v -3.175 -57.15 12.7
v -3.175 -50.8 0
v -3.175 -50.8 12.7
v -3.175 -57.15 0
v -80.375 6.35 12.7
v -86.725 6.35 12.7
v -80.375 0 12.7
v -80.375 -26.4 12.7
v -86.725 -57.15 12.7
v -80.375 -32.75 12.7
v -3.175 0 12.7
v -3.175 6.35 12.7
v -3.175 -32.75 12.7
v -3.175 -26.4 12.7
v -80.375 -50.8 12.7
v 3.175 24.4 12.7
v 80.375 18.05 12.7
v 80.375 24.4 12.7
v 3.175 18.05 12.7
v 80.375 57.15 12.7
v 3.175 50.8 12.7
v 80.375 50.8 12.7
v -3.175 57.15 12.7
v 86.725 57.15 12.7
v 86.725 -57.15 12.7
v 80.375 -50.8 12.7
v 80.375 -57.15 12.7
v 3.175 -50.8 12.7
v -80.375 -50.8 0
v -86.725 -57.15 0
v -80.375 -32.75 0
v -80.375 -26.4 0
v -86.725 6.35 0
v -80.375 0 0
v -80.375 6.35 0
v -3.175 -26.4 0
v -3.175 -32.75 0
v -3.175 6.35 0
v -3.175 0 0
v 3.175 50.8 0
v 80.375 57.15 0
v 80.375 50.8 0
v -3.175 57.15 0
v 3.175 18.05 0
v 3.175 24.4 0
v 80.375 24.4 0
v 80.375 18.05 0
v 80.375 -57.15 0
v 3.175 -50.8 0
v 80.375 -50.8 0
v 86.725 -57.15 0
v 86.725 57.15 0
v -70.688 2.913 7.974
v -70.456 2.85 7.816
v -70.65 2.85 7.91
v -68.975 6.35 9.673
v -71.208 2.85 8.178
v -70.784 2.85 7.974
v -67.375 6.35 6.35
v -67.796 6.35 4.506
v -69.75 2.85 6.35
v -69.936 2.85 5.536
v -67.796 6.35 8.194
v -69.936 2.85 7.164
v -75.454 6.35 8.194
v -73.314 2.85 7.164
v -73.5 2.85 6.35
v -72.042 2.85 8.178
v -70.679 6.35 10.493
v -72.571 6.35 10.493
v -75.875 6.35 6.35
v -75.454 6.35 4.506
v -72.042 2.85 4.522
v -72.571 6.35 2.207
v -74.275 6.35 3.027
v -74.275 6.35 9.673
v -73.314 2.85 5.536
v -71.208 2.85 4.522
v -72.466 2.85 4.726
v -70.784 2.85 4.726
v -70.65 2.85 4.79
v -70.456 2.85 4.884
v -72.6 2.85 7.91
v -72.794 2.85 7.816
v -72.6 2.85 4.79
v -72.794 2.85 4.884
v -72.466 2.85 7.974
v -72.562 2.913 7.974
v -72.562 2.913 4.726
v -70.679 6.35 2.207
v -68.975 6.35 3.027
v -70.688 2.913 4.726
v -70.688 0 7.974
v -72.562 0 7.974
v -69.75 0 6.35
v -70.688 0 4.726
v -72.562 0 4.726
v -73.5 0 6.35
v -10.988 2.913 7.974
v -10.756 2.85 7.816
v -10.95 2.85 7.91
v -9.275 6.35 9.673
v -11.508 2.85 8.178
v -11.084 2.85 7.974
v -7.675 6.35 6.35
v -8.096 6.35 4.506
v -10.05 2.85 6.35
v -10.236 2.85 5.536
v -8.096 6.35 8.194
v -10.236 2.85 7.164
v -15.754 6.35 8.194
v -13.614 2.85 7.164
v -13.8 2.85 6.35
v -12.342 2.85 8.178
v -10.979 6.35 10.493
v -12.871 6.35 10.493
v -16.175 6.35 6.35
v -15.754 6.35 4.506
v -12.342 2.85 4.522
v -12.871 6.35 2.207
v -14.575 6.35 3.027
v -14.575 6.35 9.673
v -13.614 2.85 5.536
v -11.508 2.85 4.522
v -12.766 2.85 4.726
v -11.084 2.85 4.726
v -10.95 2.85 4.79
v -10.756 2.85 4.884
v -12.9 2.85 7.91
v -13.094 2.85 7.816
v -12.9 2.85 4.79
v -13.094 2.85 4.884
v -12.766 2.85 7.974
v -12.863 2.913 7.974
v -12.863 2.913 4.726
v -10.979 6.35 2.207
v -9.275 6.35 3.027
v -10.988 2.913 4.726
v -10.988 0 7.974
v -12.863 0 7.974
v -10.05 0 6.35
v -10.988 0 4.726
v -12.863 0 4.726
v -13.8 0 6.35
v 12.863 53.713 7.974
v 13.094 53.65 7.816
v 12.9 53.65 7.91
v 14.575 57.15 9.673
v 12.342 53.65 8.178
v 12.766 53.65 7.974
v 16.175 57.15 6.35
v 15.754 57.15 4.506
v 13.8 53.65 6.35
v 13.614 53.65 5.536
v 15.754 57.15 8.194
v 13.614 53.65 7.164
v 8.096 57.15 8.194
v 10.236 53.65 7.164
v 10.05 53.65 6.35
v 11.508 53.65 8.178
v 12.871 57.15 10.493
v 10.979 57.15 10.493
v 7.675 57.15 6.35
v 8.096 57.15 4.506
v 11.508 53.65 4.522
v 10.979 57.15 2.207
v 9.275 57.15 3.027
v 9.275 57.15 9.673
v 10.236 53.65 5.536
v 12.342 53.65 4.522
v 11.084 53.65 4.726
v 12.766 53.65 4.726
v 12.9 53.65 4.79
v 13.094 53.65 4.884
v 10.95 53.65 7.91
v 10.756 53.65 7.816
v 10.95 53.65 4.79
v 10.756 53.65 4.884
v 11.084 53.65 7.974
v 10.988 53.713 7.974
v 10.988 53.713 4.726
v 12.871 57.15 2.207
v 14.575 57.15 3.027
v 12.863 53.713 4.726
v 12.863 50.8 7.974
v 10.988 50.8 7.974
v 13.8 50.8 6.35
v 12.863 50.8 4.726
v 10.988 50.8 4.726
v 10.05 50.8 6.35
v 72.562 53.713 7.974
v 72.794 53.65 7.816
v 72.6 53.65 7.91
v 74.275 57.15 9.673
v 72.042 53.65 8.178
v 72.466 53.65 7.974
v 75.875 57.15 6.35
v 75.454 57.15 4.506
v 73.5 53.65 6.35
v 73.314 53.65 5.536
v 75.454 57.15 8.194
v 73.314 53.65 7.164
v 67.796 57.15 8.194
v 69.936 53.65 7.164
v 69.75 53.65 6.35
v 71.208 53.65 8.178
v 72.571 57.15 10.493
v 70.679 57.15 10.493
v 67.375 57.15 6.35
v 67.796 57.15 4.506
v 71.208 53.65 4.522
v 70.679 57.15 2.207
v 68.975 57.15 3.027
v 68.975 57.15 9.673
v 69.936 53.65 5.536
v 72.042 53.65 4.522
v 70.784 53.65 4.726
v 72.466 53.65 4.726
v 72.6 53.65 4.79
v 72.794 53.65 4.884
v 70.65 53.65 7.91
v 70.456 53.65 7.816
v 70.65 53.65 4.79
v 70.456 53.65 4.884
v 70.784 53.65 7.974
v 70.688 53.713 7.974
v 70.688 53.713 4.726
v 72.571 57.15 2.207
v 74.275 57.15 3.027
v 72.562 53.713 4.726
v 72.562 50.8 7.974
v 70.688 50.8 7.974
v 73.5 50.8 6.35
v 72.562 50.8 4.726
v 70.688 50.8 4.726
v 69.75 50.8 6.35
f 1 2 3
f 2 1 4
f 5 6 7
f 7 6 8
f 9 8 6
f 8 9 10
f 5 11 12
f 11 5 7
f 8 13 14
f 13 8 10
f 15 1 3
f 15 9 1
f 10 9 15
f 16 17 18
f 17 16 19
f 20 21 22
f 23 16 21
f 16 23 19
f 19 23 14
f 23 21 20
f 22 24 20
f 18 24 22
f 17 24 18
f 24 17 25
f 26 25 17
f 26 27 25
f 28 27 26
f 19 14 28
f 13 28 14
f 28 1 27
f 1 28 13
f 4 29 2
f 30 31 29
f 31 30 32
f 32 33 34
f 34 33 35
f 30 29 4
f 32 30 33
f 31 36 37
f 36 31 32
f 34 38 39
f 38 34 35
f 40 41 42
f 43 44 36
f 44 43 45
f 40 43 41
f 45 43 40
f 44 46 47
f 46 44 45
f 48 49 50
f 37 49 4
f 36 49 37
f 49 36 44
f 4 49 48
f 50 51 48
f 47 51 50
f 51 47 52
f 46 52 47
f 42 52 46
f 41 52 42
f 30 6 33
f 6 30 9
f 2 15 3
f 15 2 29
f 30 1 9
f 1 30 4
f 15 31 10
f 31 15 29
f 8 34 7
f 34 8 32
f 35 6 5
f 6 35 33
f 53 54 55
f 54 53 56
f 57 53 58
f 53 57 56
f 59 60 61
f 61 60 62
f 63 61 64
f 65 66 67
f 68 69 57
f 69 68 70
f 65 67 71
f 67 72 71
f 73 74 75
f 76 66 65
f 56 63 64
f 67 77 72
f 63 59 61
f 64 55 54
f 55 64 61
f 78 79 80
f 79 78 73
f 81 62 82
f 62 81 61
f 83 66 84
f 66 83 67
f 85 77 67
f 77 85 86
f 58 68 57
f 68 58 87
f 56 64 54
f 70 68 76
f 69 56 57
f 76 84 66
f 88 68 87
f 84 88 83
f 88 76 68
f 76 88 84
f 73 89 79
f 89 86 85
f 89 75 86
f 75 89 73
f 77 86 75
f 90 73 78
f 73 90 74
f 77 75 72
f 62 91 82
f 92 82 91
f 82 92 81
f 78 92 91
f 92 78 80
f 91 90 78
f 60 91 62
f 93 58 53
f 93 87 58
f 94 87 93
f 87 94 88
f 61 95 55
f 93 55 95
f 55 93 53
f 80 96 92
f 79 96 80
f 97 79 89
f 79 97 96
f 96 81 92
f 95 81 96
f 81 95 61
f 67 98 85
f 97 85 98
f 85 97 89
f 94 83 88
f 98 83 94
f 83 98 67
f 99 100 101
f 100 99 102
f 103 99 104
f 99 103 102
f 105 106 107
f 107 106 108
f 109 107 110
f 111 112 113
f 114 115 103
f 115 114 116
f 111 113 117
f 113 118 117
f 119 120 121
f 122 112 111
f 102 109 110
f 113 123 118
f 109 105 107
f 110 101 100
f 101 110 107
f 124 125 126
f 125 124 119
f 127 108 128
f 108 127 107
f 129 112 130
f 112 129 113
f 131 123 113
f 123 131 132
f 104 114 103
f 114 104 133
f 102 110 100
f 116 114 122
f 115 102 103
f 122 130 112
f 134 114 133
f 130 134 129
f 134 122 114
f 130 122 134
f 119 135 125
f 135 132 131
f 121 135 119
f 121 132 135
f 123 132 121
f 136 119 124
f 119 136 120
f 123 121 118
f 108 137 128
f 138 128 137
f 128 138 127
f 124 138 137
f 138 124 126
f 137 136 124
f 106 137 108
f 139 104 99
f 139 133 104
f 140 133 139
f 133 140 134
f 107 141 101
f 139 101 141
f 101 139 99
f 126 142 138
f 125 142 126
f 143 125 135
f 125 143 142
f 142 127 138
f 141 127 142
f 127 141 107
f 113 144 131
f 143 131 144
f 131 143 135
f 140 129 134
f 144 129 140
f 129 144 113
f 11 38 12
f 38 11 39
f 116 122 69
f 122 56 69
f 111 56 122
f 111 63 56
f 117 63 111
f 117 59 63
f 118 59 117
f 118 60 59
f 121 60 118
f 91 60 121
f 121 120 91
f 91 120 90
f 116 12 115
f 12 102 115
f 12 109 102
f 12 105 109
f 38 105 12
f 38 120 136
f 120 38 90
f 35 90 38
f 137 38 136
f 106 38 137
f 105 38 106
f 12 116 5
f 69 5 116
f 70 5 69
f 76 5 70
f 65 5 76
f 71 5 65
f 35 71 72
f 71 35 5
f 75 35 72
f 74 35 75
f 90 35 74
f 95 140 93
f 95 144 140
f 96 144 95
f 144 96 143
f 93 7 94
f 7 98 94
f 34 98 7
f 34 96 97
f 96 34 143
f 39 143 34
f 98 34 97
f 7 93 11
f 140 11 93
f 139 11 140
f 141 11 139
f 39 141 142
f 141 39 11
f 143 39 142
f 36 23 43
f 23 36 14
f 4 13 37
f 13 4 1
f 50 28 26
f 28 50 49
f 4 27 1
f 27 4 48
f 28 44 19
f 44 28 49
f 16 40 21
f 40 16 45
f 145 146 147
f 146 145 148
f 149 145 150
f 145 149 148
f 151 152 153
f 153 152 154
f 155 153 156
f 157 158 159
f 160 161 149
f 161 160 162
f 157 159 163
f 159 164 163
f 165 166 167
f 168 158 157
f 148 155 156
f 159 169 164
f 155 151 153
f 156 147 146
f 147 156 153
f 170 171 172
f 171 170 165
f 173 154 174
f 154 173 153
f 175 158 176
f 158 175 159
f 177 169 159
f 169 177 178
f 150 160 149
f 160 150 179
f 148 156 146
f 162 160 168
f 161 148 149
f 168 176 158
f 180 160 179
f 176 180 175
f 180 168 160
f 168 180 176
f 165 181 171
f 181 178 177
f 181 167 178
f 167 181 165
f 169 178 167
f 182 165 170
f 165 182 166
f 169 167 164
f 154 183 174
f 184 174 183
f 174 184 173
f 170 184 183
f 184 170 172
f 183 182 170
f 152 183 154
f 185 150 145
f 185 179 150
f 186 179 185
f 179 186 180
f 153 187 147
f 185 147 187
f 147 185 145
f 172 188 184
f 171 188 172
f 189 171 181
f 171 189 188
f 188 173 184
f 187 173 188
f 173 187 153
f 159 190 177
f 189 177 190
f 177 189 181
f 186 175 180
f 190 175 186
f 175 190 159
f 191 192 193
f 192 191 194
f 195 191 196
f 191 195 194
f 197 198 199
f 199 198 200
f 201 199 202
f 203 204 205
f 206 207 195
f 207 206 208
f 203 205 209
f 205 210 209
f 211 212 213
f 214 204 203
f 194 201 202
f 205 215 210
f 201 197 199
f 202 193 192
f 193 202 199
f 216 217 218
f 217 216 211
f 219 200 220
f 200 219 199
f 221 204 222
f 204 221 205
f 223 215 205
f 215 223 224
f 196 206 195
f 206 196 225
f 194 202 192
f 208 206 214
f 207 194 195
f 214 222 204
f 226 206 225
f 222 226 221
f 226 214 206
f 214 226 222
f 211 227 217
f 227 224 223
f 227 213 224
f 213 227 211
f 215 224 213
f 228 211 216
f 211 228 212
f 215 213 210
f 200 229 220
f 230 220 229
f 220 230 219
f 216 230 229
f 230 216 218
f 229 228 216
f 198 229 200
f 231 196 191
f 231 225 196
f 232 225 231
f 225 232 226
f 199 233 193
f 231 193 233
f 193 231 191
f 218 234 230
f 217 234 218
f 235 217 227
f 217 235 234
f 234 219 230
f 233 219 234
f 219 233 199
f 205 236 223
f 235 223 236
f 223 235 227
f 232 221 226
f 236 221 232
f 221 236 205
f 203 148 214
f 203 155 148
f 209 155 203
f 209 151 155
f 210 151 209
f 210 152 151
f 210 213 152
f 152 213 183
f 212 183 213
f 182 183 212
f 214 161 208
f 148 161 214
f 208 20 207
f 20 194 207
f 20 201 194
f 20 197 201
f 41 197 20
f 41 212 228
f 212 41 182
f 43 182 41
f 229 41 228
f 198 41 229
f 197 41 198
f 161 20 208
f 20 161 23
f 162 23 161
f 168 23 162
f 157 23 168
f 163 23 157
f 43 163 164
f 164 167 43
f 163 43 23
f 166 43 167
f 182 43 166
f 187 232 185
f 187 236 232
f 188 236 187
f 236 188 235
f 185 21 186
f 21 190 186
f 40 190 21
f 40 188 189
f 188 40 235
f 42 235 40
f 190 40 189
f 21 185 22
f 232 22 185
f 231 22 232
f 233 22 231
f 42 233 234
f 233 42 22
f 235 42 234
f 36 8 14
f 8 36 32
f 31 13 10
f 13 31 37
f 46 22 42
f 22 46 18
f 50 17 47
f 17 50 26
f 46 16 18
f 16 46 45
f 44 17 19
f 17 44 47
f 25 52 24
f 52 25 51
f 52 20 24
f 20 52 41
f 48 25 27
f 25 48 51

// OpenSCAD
// preview[view:south, tilt:top]

/* [Shelves] */

shelf_count = 2;            // [1:1:10]
shelf_depth = 3;            // [0:0.25:12]
shelf_height = 1;           // [0:0.25:12]
shelf_length = 12;          // [0:1:120]
generate_shelf = "no";      // [yes,no]

/* [Bracket] */

bracket_thickness = .25;    // [0.25:0.25:2]
bracket_width = .5;         // [0.25:0.25:6]
step_height = 2;            // [0:0.25:12]
screw_holes = 2;            // [0:1:16]
generate_bracket = "yes";   // [yes,no]

{
    mmPadding = 1;
    mmPerInch = 25.4;
    mmShelfDepth = shelf_depth*mmPerInch;
    mmShelfDepthCut = mmShelfDepth+mmPadding;
    mmShelfHeight = shelf_height*mmPerInch;
    mmShelfHeightCut = mmShelfHeight+mmPadding;
    mmShelfLength = shelf_length*mmPerInch;
    mmStepHeight = max(mmShelfHeightCut, step_height*mmPerInch);
    mmBracketThick = bracket_thickness*mmPerInch;
    mmBracketWidth = bracket_width*mmPerInch;
    mmScrewShaft = 3.75;
    mmScrewHead = 8.5;
    mmScrewHeight = 3.5;
    mmScrewPadding = mmPadding*4+mmScrewHead/2;
    mmScrewRange = mmShelfDepth-mmScrewPadding*2;
    
    {
        bracketHeight = mmBracketThick*2+mmStepHeight*shelf_count;
        bracketBottom = -bracketHeight/2;

        // bracket
        if (generate_bracket == "yes") {
            union() {
                sectionWidth = mmShelfDepthCut+mmBracketThick;
                bracketWidth = sectionWidth*shelf_count+mmBracketThick;
                bracketLeft = -bracketWidth/2;
                
                for (section = [0:shelf_count-1]) {
                    sectionLeft = bracketLeft+section*sectionWidth;
                    sectionStep = (section+1)*mmStepHeight;
                    sectionHeight = mmBracketThick*2+sectionStep;
                    sectionTop = bracketBottom+sectionHeight;
                    supportTop = sectionTop-mmShelfHeightCut-mmBracketThick;
                    
                    translate([sectionLeft,bracketBottom,0]) {
                        // bottom
                        cube([sectionWidth,mmBracketThick,mmBracketWidth]);
                        // left
                        cube([mmBracketThick,sectionHeight,mmBracketWidth]);
                    }
                    translate([sectionLeft,supportTop-mmBracketThick,0]) {
                        // support
                        cube([sectionWidth,mmBracketThick,mmBracketWidth]);
                    }
                    translate([sectionLeft,sectionTop-mmBracketThick,0]) {
                        difference() {
                            // top
                            cube([sectionWidth,mmBracketThick,mmBracketWidth]);
                            
                            // screws
                            screwLeft = mmBracketThick+mmPadding/2+mmScrewPadding;
                            screwFlush = mmBracketThick-mmScrewHeight/2;
                            screwCenter = mmBracketWidth/2;
                            translate([screwLeft,screwFlush,screwCenter]) {
                                for (screw = [0:screw_holes-1]) {
                                    screwOffset = screw_holes == 1
                                        ? mmScrewRange/2
                                        : mmScrewRange/(screw_holes-1)*screw;
                                    translate([screwOffset,0,0]) {
                                        rotate([270,0,0]) {
                                            cylinder(d1=mmScrewShaft,d2=mmScrewHead,h=mmScrewHeight,center=true);
                                            translate([0,0,-mmBracketThick/2+mmScrewHeight/4]) {
                                                cylinder(d=mmScrewShaft,h=mmBracketThick,center=true);
                                            }
                                        }
                                    }
                                }
                            }
                        }
                    }
                }
                
                translate([-bracketLeft-mmBracketThick,bracketBottom,0]) {
                    // right
                    cube([mmBracketThick,bracketHeight,mmBracketWidth]);
                }
            }
        }            
        
        // shelf
        if (generate_shelf == "yes") {
            shelfOffset = generate_bracket == "yes"
                ? bracketBottom-mmShelfDepth/2-mmBracketThick
                : mmShelfDepth/2;
            translate([0,shelfOffset,mmShelfHeight/2]) {
                difference() {
                    // shape
                    cube([mmShelfLength,mmShelfDepth,mmShelfHeight],center=true);
                    translate([0,0,mmBracketThick/2]) {
                        // hollow
                        cube([mmShelfLength,mmShelfDepth-mmBracketThick*2,mmShelfHeight],center=true);
                    }

                    // screws
                    for(side = [-1,1]) {
                        screwSide = (mmShelfLength/2-mmBracketThick)*side;
                        screwBottom = -mmShelfDepth/2+mmScrewPadding;
                        for(screw = [0:screw_holes-1]) {
                            screwPos = screw_holes==1 ? 0 : screwBottom+mmScrewRange/(screw_holes-1)*screw;
                            translate([screwSide,screwPos,0]) {
                                cylinder(d=mmScrewShaft,h=mmShelfHeight,center=true);
                            }
                        }
                    }
                }
            }
        }
    }
}
